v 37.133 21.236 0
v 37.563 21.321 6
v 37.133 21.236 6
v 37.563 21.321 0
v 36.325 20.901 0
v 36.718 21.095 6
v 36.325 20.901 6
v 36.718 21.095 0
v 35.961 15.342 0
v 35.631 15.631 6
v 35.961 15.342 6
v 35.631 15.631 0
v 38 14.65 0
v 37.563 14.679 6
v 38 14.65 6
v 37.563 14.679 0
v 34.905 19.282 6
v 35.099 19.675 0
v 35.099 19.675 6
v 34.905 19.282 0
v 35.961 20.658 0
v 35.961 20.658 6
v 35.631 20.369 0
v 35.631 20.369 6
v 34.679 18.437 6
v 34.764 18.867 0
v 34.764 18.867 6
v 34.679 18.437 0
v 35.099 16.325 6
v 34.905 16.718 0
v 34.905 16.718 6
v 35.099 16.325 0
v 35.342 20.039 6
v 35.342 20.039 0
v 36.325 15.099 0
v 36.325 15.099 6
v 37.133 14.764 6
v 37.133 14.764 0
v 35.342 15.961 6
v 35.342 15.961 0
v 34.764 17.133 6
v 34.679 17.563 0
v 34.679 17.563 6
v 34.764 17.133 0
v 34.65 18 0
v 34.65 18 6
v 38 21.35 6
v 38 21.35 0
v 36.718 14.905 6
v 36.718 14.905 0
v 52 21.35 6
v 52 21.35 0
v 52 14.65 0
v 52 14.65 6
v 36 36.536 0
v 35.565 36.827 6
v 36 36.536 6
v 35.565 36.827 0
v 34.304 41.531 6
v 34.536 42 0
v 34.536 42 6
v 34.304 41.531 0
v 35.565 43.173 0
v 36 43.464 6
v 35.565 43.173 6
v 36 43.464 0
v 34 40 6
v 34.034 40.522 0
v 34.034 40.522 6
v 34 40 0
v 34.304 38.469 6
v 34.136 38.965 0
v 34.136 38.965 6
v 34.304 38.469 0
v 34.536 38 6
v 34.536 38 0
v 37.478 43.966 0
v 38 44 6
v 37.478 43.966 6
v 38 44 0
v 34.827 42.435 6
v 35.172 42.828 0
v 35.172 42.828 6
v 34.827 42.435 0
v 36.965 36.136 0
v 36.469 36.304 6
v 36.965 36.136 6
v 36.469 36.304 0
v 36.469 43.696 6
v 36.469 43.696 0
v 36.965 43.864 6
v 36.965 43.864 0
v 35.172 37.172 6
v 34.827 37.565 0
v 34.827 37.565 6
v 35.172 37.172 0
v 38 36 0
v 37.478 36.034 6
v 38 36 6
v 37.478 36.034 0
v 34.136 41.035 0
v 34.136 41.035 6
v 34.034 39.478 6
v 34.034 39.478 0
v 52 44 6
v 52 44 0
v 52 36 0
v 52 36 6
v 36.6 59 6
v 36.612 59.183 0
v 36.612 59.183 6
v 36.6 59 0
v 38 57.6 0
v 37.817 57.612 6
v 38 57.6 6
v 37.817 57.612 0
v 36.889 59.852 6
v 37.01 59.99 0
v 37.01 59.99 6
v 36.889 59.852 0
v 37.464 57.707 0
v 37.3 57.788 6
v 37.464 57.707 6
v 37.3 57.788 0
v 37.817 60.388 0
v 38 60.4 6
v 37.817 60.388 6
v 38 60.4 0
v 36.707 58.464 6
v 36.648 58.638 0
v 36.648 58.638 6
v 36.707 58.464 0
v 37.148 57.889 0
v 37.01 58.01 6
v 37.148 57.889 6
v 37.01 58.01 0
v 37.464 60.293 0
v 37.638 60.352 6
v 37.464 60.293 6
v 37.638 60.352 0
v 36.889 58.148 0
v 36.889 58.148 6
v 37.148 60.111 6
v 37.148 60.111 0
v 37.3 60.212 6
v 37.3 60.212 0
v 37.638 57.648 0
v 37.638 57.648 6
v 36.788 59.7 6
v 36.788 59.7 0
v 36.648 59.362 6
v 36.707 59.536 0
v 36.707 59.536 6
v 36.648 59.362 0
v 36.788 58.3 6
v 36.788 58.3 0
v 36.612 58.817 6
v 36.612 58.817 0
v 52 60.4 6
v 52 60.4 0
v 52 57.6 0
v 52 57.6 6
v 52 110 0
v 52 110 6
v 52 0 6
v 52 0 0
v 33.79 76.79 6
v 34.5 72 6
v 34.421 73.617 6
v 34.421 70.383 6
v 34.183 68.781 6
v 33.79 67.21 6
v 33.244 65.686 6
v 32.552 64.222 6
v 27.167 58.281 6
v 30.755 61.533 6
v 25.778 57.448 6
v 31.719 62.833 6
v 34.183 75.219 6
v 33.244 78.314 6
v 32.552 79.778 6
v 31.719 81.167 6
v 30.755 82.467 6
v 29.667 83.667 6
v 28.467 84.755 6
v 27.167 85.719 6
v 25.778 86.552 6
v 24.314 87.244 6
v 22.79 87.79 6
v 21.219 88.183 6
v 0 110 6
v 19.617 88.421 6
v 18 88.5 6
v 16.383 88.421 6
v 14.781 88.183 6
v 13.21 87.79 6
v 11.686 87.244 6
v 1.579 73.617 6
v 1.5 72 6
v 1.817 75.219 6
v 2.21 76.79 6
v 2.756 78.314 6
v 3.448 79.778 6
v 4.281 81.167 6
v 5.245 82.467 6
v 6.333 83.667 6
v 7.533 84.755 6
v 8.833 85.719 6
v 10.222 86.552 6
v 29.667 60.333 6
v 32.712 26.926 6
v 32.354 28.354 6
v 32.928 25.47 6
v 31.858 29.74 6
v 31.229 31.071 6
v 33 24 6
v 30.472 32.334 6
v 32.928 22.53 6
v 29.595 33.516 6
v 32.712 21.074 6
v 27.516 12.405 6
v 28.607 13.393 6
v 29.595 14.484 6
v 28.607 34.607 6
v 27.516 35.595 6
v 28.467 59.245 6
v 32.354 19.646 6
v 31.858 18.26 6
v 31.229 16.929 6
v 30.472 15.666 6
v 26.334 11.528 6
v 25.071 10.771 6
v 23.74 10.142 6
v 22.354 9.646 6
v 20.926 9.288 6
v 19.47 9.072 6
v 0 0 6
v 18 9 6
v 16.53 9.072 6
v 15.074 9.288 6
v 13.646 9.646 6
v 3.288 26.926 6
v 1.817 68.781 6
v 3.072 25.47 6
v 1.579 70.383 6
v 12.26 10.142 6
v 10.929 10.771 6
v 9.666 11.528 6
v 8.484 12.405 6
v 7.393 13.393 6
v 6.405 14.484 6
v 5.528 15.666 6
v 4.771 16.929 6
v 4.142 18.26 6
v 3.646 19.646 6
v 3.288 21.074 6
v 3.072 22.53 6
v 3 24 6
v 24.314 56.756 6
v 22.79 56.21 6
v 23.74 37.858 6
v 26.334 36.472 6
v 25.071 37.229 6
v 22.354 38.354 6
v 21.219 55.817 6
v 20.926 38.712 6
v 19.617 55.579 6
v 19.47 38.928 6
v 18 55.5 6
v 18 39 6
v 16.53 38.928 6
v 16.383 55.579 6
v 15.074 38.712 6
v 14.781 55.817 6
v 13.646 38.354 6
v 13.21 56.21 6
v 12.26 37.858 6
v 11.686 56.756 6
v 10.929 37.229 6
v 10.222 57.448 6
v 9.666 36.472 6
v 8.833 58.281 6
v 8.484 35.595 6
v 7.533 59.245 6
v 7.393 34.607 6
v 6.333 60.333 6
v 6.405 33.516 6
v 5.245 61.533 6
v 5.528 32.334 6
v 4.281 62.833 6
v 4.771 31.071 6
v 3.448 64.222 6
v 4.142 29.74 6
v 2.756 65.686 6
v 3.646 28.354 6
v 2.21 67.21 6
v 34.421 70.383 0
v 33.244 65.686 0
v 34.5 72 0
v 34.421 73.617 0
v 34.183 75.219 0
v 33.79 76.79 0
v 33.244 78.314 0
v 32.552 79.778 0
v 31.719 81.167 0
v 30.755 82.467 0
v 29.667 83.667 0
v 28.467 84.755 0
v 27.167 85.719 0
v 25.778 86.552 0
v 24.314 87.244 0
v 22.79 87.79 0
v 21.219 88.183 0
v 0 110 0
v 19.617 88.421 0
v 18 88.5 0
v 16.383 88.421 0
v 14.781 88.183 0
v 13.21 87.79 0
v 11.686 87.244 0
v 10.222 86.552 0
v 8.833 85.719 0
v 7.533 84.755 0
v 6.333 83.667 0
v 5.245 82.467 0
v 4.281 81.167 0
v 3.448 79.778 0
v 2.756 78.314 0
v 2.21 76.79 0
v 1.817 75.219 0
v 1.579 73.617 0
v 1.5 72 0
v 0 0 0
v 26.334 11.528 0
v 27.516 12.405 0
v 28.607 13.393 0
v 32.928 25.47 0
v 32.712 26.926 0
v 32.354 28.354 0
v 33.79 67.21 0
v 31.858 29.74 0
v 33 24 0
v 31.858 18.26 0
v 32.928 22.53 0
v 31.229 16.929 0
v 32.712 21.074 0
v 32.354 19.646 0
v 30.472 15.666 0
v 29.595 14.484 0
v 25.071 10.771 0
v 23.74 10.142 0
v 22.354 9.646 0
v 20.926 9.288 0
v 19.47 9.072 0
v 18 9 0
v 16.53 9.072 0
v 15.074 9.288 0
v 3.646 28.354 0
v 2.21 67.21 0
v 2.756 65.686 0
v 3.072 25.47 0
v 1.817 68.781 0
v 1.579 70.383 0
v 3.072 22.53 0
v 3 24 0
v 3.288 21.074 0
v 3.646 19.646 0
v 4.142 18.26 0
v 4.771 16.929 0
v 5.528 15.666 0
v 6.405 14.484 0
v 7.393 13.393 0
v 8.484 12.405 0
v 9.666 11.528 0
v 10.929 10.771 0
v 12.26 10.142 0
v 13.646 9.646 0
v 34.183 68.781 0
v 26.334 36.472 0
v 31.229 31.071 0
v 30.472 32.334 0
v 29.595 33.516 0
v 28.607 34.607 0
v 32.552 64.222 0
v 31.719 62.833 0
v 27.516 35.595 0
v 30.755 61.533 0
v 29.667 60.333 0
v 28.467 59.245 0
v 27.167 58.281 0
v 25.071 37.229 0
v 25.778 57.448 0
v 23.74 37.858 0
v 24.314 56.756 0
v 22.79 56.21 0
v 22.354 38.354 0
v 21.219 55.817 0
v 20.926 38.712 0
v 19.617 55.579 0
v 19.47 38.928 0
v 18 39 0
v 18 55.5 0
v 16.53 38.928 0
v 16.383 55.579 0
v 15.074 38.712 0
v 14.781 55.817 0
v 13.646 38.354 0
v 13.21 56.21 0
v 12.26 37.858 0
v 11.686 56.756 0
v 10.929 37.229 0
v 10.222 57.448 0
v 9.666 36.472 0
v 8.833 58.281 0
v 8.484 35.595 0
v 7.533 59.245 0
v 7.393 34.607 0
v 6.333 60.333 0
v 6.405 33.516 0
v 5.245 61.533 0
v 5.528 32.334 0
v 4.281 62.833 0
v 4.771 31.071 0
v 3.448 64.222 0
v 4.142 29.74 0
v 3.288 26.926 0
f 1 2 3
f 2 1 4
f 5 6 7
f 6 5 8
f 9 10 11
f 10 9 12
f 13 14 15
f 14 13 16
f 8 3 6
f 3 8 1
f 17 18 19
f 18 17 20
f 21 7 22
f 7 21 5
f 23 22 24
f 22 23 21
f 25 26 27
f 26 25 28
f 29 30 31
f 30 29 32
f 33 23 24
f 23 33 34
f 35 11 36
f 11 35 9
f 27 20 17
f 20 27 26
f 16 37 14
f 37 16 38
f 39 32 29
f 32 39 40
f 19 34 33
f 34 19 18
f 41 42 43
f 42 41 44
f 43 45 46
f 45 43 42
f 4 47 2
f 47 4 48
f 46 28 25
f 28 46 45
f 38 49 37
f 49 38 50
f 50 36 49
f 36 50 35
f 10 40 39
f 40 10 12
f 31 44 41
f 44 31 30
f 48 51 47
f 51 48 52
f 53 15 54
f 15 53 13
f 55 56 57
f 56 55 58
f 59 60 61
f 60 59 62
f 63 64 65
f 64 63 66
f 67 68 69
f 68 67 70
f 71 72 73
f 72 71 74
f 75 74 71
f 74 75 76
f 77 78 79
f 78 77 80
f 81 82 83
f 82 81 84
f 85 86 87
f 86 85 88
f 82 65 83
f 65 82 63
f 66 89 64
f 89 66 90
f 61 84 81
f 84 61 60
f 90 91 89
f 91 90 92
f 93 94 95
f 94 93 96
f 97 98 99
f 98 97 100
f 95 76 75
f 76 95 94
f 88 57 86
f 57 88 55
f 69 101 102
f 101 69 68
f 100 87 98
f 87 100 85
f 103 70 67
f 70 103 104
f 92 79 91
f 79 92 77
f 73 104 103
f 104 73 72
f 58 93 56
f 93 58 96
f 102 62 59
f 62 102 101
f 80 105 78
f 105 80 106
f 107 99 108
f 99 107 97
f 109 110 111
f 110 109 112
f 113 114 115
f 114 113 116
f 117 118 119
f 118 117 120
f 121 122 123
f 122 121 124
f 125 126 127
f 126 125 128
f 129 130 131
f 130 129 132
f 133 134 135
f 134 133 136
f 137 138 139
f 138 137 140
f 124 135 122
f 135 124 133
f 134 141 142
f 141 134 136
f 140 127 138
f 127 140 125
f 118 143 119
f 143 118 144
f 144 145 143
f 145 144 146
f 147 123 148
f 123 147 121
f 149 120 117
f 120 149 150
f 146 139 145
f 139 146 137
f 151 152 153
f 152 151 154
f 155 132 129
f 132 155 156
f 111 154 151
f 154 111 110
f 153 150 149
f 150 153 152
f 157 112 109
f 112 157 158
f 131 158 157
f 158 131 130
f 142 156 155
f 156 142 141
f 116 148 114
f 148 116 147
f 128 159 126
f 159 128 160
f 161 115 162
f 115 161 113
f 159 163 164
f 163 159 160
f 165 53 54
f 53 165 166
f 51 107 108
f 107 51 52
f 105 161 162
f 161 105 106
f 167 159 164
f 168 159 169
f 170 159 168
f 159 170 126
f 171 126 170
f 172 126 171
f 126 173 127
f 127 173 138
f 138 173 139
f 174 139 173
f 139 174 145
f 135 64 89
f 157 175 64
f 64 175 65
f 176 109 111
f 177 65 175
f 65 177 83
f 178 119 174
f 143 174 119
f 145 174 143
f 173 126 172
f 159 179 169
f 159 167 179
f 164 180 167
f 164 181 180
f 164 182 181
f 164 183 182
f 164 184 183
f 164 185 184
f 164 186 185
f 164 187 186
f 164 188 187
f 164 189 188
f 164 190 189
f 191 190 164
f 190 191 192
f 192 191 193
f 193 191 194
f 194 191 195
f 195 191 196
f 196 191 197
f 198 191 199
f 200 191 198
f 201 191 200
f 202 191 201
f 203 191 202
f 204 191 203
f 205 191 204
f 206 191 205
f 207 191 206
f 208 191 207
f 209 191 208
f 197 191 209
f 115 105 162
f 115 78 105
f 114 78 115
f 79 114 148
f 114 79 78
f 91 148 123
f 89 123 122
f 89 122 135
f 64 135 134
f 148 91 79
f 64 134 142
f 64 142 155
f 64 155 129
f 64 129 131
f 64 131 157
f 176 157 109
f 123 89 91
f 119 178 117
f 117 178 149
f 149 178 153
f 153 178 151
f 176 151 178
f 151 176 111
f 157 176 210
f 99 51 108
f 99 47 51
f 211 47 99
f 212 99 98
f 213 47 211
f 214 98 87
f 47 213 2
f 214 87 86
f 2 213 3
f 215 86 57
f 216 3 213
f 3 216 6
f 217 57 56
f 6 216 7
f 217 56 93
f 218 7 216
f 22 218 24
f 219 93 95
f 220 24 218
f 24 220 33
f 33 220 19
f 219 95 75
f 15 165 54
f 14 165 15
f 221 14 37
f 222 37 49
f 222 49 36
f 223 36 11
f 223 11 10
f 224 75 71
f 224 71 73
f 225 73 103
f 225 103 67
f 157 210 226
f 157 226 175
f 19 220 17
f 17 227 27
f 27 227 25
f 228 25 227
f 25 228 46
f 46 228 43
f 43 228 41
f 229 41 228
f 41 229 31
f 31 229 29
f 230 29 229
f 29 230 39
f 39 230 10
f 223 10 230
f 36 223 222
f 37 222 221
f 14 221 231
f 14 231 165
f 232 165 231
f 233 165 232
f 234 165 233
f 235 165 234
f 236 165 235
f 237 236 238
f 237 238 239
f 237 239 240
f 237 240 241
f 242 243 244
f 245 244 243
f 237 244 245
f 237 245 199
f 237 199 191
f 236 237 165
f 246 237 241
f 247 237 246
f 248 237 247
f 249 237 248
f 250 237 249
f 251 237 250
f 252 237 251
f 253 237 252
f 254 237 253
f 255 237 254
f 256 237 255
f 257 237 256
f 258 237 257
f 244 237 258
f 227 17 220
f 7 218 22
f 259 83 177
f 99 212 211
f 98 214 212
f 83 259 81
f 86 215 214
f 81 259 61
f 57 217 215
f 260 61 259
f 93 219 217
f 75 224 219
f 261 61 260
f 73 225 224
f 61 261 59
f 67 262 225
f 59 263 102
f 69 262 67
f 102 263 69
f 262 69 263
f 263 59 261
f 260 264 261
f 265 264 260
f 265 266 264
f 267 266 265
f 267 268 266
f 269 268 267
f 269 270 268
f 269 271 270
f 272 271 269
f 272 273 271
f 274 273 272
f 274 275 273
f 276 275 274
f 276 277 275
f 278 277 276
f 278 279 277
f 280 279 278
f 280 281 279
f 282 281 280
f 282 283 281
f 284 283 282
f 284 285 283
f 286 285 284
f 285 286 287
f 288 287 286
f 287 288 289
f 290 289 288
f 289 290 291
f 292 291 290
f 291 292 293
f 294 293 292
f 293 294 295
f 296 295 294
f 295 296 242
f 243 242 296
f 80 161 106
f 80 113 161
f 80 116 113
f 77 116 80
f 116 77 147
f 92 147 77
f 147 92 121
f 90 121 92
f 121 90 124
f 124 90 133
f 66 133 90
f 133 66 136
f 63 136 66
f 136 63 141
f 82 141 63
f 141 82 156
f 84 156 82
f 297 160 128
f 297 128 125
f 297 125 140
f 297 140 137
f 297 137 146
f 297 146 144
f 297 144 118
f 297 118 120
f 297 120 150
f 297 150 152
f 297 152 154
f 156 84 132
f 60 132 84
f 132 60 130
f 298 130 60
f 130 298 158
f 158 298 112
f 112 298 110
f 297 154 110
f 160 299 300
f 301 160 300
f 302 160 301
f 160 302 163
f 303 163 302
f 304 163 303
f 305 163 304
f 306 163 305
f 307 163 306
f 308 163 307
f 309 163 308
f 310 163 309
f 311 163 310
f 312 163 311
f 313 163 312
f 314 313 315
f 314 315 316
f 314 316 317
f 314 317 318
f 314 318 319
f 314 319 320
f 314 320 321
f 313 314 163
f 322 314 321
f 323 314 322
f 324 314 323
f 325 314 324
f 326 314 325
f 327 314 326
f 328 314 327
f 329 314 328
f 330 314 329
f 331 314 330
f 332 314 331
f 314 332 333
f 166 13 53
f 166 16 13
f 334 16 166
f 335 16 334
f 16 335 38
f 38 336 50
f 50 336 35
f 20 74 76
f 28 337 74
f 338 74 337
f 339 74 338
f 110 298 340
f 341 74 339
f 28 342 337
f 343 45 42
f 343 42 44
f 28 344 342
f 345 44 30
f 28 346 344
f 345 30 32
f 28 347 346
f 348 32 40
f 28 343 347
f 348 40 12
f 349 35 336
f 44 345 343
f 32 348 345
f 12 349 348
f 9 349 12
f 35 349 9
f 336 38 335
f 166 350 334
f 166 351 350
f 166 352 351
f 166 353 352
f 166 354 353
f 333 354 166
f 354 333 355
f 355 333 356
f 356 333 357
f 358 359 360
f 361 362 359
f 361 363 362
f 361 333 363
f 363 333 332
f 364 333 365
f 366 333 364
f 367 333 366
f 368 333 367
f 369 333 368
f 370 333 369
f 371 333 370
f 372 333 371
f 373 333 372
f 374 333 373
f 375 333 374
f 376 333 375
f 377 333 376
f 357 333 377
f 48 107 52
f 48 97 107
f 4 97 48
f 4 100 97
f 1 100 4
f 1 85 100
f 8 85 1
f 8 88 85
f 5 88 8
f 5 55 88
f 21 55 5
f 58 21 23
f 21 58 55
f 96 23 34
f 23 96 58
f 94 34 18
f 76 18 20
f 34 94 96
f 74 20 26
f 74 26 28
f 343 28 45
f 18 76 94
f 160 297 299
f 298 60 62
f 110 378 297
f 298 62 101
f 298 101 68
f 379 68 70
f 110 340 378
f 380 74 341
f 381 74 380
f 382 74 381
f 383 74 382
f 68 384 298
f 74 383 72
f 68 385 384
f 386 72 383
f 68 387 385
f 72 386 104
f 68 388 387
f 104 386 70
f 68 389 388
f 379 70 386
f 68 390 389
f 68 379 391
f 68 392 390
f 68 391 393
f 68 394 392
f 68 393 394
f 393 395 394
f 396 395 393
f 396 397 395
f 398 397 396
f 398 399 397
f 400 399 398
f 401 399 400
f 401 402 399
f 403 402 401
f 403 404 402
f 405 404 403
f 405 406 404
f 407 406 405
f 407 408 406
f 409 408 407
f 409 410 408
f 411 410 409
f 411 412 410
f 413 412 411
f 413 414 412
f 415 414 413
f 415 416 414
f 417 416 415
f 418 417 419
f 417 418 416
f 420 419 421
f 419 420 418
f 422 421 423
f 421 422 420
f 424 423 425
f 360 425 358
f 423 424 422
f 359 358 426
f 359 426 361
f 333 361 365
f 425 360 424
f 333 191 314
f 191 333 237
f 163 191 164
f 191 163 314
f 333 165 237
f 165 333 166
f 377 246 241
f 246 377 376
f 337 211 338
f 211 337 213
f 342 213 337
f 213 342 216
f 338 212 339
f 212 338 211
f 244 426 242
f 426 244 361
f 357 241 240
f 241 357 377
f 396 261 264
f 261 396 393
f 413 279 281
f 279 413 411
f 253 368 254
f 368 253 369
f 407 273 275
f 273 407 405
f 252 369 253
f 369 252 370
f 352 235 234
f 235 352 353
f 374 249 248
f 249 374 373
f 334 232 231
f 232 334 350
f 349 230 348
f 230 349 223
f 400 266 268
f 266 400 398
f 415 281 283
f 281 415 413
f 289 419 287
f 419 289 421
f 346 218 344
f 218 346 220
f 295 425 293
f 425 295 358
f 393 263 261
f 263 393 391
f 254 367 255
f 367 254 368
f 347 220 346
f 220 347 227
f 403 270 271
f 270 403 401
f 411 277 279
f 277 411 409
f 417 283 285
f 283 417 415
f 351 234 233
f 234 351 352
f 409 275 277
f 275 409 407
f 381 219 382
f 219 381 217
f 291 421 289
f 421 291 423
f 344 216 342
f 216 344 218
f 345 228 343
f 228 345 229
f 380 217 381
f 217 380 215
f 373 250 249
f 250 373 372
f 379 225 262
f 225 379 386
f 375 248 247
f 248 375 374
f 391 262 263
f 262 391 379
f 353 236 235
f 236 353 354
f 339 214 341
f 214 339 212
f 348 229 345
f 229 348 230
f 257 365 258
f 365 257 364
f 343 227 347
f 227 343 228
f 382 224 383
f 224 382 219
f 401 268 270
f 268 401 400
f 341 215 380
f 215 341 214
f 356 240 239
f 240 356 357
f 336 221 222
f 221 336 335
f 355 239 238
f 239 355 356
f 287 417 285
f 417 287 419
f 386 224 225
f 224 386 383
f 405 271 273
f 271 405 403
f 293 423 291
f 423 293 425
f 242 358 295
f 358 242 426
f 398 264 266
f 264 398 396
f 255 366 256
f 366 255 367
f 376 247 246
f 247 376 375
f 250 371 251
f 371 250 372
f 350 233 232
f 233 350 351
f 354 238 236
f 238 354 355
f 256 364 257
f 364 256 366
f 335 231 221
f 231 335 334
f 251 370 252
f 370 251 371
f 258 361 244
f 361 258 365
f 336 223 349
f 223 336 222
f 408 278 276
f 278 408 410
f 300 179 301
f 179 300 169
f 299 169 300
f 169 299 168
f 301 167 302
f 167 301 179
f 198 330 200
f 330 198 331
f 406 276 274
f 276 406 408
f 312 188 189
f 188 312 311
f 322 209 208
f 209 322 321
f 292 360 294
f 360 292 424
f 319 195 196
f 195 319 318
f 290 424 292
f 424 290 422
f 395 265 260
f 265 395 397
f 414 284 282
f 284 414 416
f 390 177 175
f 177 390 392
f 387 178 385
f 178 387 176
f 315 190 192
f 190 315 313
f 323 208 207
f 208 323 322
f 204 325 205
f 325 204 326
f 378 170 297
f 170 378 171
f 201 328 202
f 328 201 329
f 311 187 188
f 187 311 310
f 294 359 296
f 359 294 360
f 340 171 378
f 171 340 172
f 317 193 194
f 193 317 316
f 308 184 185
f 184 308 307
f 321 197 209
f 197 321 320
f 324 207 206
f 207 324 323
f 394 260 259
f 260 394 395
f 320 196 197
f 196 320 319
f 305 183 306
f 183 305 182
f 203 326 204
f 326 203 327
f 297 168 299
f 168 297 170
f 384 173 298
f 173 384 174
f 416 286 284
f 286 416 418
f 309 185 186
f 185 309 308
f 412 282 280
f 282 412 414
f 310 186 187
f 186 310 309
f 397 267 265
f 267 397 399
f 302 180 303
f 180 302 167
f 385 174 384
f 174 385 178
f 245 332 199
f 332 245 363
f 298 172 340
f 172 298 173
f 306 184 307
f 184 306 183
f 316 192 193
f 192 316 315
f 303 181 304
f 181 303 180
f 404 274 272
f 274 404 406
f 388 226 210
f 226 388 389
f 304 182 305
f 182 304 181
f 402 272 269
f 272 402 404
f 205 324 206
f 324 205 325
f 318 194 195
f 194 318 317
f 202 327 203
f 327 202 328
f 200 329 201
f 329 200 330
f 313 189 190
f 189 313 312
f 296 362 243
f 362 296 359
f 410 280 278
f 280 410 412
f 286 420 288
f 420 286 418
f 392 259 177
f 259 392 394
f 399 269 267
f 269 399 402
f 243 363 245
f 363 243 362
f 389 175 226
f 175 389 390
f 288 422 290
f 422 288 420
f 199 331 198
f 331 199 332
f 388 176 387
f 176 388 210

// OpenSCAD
// file: ../src/mount.scad
/*
  Reusable pegboard mount geometry.
  Units: mm.

  Mechanical architecture:
    - curved upper retaining hooks
    - straight lower locating pegs one grid row below

  The current geometry is based on physical testing plus a known-working
  PEGSTR-derived reference. See docs/THIRD_PARTY.md before redistributing or
  relicensing derived geometry.
*/

module pegboard_pin(
    clip=false,
    peg_d=5.5,
    board_geom=5.0,
    neck_length=0.5,
    epsilon=0.1
) {
    clip_height = 2 * peg_d + 2;

    rotate([0,0,15])
        cylinder(
            r = peg_d / 2,
            h = clip ? neck_length : board_geom * 1.5 + epsilon,
            center = true,
            $fn = 12
        );

    if (clip) {
        rotate([0,0,90])
        intersection() {
            translate([0, 0, peg_d - epsilon])
                cube(
                    [peg_d + 2*epsilon, clip_height, 2*peg_d],
                    center = true
                );

            translate([0, peg_d/2 + 2, board_geom/2])
                rotate([0,90,0])
                rotate_extrude(convexity = 5, $fn = 20)
                    translate([5.5,0,0])
                        circle(r = (peg_d * 0.95) / 2, $fn = 20);

            translate([0, peg_d/2 + 0.5, board_geom/2])
                rotate([45,0,0])
                translate([0,0,peg_d * 0.6])
                    cube(
                        [peg_d + 2*epsilon, 3*peg_d, peg_d],
                        center = true
                    );
        }
    }
}


module pegboard_mount_pins(
    columns=2,
    pitch=25.4,
    peg_d=5.5,
    board_geom=5.0,
    hook_offset=4.5,
    neck_length=0.5,
    epsilon=0.1
) {
    width = (columns - 1) * pitch;

    rotate([0,90,0]) {
        for (i = [0:columns-1]) {
            column = -width/2 + i*pitch;

            translate([0, column, -hook_offset])
                pegboard_pin(
                    clip=true,
                    peg_d=peg_d,
                    board_geom=board_geom,
                    neck_length=neck_length,
                    epsilon=epsilon
                );

            translate([pitch, column, 0])
                pegboard_pin(
                    clip=false,
                    peg_d=peg_d,
                    board_geom=board_geom,
                    neck_length=neck_length,
                    epsilon=epsilon
                );
        }
    }
}


module pegboard_mount_plate(
    columns=2,
    pitch=25.4,
    peg_d=5.5,
    board_geom=5.0,
    neck_length=0.5,
    base_wall_thickness=1.85,
    root_clearance=0.20,
    epsilon=0.1
) {
    width = (columns - 1) * pitch;
    clip_height = 2 * peg_d + 2;
    root_cover = neck_length + root_clearance;
    plate_thickness = base_wall_thickness + root_cover;

    rotate([0,90,0])
    translate([
        -epsilon,
        0,
        -plate_thickness - board_geom/2 + epsilon
    ])
    hull() {
        for (i = [0:columns-1]) {
            column = -width/2 + i*pitch;

            translate([
                -clip_height/2 + peg_d/2,
                column,
                0
            ])
                cylinder(r=peg_d/2, h=plate_thickness, $fn=32);

            translate([
                pitch,
                column,
                0
            ])
                cylinder(r=peg_d/2, h=plate_thickness, $fn=32);
        }
    }
}


module pegboard_mount(
    columns=2,
    pitch=25.4,
    peg_d=5.5,
    board_geom=5.0,
    hook_offset=4.5,
    neck_length=0.5,
    base_wall_thickness=1.85,
    root_clearance=0.20,
    epsilon=0.1,
    include_plate=true
) {
    union() {
        if (include_plate)
            pegboard_mount_plate(
                columns=columns,
                pitch=pitch,
                peg_d=peg_d,
                board_geom=board_geom,
                neck_length=neck_length,
                base_wall_thickness=base_wall_thickness,
                root_clearance=root_clearance,
                epsilon=epsilon
            );

        pegboard_mount_pins(
            columns=columns,
            pitch=pitch,
            peg_d=peg_d,
            board_geom=board_geom,
            hook_offset=hook_offset,
            neck_length=neck_length,
            epsilon=epsilon
        );
    }
}
// main file
use <../src/driver_station.scad>

// Tool-interface coupon only. Print flat at 100% scale before committing to
// the larger driver-station pieces if you want to validate local clearances.
driver_station_fit_coupon();
